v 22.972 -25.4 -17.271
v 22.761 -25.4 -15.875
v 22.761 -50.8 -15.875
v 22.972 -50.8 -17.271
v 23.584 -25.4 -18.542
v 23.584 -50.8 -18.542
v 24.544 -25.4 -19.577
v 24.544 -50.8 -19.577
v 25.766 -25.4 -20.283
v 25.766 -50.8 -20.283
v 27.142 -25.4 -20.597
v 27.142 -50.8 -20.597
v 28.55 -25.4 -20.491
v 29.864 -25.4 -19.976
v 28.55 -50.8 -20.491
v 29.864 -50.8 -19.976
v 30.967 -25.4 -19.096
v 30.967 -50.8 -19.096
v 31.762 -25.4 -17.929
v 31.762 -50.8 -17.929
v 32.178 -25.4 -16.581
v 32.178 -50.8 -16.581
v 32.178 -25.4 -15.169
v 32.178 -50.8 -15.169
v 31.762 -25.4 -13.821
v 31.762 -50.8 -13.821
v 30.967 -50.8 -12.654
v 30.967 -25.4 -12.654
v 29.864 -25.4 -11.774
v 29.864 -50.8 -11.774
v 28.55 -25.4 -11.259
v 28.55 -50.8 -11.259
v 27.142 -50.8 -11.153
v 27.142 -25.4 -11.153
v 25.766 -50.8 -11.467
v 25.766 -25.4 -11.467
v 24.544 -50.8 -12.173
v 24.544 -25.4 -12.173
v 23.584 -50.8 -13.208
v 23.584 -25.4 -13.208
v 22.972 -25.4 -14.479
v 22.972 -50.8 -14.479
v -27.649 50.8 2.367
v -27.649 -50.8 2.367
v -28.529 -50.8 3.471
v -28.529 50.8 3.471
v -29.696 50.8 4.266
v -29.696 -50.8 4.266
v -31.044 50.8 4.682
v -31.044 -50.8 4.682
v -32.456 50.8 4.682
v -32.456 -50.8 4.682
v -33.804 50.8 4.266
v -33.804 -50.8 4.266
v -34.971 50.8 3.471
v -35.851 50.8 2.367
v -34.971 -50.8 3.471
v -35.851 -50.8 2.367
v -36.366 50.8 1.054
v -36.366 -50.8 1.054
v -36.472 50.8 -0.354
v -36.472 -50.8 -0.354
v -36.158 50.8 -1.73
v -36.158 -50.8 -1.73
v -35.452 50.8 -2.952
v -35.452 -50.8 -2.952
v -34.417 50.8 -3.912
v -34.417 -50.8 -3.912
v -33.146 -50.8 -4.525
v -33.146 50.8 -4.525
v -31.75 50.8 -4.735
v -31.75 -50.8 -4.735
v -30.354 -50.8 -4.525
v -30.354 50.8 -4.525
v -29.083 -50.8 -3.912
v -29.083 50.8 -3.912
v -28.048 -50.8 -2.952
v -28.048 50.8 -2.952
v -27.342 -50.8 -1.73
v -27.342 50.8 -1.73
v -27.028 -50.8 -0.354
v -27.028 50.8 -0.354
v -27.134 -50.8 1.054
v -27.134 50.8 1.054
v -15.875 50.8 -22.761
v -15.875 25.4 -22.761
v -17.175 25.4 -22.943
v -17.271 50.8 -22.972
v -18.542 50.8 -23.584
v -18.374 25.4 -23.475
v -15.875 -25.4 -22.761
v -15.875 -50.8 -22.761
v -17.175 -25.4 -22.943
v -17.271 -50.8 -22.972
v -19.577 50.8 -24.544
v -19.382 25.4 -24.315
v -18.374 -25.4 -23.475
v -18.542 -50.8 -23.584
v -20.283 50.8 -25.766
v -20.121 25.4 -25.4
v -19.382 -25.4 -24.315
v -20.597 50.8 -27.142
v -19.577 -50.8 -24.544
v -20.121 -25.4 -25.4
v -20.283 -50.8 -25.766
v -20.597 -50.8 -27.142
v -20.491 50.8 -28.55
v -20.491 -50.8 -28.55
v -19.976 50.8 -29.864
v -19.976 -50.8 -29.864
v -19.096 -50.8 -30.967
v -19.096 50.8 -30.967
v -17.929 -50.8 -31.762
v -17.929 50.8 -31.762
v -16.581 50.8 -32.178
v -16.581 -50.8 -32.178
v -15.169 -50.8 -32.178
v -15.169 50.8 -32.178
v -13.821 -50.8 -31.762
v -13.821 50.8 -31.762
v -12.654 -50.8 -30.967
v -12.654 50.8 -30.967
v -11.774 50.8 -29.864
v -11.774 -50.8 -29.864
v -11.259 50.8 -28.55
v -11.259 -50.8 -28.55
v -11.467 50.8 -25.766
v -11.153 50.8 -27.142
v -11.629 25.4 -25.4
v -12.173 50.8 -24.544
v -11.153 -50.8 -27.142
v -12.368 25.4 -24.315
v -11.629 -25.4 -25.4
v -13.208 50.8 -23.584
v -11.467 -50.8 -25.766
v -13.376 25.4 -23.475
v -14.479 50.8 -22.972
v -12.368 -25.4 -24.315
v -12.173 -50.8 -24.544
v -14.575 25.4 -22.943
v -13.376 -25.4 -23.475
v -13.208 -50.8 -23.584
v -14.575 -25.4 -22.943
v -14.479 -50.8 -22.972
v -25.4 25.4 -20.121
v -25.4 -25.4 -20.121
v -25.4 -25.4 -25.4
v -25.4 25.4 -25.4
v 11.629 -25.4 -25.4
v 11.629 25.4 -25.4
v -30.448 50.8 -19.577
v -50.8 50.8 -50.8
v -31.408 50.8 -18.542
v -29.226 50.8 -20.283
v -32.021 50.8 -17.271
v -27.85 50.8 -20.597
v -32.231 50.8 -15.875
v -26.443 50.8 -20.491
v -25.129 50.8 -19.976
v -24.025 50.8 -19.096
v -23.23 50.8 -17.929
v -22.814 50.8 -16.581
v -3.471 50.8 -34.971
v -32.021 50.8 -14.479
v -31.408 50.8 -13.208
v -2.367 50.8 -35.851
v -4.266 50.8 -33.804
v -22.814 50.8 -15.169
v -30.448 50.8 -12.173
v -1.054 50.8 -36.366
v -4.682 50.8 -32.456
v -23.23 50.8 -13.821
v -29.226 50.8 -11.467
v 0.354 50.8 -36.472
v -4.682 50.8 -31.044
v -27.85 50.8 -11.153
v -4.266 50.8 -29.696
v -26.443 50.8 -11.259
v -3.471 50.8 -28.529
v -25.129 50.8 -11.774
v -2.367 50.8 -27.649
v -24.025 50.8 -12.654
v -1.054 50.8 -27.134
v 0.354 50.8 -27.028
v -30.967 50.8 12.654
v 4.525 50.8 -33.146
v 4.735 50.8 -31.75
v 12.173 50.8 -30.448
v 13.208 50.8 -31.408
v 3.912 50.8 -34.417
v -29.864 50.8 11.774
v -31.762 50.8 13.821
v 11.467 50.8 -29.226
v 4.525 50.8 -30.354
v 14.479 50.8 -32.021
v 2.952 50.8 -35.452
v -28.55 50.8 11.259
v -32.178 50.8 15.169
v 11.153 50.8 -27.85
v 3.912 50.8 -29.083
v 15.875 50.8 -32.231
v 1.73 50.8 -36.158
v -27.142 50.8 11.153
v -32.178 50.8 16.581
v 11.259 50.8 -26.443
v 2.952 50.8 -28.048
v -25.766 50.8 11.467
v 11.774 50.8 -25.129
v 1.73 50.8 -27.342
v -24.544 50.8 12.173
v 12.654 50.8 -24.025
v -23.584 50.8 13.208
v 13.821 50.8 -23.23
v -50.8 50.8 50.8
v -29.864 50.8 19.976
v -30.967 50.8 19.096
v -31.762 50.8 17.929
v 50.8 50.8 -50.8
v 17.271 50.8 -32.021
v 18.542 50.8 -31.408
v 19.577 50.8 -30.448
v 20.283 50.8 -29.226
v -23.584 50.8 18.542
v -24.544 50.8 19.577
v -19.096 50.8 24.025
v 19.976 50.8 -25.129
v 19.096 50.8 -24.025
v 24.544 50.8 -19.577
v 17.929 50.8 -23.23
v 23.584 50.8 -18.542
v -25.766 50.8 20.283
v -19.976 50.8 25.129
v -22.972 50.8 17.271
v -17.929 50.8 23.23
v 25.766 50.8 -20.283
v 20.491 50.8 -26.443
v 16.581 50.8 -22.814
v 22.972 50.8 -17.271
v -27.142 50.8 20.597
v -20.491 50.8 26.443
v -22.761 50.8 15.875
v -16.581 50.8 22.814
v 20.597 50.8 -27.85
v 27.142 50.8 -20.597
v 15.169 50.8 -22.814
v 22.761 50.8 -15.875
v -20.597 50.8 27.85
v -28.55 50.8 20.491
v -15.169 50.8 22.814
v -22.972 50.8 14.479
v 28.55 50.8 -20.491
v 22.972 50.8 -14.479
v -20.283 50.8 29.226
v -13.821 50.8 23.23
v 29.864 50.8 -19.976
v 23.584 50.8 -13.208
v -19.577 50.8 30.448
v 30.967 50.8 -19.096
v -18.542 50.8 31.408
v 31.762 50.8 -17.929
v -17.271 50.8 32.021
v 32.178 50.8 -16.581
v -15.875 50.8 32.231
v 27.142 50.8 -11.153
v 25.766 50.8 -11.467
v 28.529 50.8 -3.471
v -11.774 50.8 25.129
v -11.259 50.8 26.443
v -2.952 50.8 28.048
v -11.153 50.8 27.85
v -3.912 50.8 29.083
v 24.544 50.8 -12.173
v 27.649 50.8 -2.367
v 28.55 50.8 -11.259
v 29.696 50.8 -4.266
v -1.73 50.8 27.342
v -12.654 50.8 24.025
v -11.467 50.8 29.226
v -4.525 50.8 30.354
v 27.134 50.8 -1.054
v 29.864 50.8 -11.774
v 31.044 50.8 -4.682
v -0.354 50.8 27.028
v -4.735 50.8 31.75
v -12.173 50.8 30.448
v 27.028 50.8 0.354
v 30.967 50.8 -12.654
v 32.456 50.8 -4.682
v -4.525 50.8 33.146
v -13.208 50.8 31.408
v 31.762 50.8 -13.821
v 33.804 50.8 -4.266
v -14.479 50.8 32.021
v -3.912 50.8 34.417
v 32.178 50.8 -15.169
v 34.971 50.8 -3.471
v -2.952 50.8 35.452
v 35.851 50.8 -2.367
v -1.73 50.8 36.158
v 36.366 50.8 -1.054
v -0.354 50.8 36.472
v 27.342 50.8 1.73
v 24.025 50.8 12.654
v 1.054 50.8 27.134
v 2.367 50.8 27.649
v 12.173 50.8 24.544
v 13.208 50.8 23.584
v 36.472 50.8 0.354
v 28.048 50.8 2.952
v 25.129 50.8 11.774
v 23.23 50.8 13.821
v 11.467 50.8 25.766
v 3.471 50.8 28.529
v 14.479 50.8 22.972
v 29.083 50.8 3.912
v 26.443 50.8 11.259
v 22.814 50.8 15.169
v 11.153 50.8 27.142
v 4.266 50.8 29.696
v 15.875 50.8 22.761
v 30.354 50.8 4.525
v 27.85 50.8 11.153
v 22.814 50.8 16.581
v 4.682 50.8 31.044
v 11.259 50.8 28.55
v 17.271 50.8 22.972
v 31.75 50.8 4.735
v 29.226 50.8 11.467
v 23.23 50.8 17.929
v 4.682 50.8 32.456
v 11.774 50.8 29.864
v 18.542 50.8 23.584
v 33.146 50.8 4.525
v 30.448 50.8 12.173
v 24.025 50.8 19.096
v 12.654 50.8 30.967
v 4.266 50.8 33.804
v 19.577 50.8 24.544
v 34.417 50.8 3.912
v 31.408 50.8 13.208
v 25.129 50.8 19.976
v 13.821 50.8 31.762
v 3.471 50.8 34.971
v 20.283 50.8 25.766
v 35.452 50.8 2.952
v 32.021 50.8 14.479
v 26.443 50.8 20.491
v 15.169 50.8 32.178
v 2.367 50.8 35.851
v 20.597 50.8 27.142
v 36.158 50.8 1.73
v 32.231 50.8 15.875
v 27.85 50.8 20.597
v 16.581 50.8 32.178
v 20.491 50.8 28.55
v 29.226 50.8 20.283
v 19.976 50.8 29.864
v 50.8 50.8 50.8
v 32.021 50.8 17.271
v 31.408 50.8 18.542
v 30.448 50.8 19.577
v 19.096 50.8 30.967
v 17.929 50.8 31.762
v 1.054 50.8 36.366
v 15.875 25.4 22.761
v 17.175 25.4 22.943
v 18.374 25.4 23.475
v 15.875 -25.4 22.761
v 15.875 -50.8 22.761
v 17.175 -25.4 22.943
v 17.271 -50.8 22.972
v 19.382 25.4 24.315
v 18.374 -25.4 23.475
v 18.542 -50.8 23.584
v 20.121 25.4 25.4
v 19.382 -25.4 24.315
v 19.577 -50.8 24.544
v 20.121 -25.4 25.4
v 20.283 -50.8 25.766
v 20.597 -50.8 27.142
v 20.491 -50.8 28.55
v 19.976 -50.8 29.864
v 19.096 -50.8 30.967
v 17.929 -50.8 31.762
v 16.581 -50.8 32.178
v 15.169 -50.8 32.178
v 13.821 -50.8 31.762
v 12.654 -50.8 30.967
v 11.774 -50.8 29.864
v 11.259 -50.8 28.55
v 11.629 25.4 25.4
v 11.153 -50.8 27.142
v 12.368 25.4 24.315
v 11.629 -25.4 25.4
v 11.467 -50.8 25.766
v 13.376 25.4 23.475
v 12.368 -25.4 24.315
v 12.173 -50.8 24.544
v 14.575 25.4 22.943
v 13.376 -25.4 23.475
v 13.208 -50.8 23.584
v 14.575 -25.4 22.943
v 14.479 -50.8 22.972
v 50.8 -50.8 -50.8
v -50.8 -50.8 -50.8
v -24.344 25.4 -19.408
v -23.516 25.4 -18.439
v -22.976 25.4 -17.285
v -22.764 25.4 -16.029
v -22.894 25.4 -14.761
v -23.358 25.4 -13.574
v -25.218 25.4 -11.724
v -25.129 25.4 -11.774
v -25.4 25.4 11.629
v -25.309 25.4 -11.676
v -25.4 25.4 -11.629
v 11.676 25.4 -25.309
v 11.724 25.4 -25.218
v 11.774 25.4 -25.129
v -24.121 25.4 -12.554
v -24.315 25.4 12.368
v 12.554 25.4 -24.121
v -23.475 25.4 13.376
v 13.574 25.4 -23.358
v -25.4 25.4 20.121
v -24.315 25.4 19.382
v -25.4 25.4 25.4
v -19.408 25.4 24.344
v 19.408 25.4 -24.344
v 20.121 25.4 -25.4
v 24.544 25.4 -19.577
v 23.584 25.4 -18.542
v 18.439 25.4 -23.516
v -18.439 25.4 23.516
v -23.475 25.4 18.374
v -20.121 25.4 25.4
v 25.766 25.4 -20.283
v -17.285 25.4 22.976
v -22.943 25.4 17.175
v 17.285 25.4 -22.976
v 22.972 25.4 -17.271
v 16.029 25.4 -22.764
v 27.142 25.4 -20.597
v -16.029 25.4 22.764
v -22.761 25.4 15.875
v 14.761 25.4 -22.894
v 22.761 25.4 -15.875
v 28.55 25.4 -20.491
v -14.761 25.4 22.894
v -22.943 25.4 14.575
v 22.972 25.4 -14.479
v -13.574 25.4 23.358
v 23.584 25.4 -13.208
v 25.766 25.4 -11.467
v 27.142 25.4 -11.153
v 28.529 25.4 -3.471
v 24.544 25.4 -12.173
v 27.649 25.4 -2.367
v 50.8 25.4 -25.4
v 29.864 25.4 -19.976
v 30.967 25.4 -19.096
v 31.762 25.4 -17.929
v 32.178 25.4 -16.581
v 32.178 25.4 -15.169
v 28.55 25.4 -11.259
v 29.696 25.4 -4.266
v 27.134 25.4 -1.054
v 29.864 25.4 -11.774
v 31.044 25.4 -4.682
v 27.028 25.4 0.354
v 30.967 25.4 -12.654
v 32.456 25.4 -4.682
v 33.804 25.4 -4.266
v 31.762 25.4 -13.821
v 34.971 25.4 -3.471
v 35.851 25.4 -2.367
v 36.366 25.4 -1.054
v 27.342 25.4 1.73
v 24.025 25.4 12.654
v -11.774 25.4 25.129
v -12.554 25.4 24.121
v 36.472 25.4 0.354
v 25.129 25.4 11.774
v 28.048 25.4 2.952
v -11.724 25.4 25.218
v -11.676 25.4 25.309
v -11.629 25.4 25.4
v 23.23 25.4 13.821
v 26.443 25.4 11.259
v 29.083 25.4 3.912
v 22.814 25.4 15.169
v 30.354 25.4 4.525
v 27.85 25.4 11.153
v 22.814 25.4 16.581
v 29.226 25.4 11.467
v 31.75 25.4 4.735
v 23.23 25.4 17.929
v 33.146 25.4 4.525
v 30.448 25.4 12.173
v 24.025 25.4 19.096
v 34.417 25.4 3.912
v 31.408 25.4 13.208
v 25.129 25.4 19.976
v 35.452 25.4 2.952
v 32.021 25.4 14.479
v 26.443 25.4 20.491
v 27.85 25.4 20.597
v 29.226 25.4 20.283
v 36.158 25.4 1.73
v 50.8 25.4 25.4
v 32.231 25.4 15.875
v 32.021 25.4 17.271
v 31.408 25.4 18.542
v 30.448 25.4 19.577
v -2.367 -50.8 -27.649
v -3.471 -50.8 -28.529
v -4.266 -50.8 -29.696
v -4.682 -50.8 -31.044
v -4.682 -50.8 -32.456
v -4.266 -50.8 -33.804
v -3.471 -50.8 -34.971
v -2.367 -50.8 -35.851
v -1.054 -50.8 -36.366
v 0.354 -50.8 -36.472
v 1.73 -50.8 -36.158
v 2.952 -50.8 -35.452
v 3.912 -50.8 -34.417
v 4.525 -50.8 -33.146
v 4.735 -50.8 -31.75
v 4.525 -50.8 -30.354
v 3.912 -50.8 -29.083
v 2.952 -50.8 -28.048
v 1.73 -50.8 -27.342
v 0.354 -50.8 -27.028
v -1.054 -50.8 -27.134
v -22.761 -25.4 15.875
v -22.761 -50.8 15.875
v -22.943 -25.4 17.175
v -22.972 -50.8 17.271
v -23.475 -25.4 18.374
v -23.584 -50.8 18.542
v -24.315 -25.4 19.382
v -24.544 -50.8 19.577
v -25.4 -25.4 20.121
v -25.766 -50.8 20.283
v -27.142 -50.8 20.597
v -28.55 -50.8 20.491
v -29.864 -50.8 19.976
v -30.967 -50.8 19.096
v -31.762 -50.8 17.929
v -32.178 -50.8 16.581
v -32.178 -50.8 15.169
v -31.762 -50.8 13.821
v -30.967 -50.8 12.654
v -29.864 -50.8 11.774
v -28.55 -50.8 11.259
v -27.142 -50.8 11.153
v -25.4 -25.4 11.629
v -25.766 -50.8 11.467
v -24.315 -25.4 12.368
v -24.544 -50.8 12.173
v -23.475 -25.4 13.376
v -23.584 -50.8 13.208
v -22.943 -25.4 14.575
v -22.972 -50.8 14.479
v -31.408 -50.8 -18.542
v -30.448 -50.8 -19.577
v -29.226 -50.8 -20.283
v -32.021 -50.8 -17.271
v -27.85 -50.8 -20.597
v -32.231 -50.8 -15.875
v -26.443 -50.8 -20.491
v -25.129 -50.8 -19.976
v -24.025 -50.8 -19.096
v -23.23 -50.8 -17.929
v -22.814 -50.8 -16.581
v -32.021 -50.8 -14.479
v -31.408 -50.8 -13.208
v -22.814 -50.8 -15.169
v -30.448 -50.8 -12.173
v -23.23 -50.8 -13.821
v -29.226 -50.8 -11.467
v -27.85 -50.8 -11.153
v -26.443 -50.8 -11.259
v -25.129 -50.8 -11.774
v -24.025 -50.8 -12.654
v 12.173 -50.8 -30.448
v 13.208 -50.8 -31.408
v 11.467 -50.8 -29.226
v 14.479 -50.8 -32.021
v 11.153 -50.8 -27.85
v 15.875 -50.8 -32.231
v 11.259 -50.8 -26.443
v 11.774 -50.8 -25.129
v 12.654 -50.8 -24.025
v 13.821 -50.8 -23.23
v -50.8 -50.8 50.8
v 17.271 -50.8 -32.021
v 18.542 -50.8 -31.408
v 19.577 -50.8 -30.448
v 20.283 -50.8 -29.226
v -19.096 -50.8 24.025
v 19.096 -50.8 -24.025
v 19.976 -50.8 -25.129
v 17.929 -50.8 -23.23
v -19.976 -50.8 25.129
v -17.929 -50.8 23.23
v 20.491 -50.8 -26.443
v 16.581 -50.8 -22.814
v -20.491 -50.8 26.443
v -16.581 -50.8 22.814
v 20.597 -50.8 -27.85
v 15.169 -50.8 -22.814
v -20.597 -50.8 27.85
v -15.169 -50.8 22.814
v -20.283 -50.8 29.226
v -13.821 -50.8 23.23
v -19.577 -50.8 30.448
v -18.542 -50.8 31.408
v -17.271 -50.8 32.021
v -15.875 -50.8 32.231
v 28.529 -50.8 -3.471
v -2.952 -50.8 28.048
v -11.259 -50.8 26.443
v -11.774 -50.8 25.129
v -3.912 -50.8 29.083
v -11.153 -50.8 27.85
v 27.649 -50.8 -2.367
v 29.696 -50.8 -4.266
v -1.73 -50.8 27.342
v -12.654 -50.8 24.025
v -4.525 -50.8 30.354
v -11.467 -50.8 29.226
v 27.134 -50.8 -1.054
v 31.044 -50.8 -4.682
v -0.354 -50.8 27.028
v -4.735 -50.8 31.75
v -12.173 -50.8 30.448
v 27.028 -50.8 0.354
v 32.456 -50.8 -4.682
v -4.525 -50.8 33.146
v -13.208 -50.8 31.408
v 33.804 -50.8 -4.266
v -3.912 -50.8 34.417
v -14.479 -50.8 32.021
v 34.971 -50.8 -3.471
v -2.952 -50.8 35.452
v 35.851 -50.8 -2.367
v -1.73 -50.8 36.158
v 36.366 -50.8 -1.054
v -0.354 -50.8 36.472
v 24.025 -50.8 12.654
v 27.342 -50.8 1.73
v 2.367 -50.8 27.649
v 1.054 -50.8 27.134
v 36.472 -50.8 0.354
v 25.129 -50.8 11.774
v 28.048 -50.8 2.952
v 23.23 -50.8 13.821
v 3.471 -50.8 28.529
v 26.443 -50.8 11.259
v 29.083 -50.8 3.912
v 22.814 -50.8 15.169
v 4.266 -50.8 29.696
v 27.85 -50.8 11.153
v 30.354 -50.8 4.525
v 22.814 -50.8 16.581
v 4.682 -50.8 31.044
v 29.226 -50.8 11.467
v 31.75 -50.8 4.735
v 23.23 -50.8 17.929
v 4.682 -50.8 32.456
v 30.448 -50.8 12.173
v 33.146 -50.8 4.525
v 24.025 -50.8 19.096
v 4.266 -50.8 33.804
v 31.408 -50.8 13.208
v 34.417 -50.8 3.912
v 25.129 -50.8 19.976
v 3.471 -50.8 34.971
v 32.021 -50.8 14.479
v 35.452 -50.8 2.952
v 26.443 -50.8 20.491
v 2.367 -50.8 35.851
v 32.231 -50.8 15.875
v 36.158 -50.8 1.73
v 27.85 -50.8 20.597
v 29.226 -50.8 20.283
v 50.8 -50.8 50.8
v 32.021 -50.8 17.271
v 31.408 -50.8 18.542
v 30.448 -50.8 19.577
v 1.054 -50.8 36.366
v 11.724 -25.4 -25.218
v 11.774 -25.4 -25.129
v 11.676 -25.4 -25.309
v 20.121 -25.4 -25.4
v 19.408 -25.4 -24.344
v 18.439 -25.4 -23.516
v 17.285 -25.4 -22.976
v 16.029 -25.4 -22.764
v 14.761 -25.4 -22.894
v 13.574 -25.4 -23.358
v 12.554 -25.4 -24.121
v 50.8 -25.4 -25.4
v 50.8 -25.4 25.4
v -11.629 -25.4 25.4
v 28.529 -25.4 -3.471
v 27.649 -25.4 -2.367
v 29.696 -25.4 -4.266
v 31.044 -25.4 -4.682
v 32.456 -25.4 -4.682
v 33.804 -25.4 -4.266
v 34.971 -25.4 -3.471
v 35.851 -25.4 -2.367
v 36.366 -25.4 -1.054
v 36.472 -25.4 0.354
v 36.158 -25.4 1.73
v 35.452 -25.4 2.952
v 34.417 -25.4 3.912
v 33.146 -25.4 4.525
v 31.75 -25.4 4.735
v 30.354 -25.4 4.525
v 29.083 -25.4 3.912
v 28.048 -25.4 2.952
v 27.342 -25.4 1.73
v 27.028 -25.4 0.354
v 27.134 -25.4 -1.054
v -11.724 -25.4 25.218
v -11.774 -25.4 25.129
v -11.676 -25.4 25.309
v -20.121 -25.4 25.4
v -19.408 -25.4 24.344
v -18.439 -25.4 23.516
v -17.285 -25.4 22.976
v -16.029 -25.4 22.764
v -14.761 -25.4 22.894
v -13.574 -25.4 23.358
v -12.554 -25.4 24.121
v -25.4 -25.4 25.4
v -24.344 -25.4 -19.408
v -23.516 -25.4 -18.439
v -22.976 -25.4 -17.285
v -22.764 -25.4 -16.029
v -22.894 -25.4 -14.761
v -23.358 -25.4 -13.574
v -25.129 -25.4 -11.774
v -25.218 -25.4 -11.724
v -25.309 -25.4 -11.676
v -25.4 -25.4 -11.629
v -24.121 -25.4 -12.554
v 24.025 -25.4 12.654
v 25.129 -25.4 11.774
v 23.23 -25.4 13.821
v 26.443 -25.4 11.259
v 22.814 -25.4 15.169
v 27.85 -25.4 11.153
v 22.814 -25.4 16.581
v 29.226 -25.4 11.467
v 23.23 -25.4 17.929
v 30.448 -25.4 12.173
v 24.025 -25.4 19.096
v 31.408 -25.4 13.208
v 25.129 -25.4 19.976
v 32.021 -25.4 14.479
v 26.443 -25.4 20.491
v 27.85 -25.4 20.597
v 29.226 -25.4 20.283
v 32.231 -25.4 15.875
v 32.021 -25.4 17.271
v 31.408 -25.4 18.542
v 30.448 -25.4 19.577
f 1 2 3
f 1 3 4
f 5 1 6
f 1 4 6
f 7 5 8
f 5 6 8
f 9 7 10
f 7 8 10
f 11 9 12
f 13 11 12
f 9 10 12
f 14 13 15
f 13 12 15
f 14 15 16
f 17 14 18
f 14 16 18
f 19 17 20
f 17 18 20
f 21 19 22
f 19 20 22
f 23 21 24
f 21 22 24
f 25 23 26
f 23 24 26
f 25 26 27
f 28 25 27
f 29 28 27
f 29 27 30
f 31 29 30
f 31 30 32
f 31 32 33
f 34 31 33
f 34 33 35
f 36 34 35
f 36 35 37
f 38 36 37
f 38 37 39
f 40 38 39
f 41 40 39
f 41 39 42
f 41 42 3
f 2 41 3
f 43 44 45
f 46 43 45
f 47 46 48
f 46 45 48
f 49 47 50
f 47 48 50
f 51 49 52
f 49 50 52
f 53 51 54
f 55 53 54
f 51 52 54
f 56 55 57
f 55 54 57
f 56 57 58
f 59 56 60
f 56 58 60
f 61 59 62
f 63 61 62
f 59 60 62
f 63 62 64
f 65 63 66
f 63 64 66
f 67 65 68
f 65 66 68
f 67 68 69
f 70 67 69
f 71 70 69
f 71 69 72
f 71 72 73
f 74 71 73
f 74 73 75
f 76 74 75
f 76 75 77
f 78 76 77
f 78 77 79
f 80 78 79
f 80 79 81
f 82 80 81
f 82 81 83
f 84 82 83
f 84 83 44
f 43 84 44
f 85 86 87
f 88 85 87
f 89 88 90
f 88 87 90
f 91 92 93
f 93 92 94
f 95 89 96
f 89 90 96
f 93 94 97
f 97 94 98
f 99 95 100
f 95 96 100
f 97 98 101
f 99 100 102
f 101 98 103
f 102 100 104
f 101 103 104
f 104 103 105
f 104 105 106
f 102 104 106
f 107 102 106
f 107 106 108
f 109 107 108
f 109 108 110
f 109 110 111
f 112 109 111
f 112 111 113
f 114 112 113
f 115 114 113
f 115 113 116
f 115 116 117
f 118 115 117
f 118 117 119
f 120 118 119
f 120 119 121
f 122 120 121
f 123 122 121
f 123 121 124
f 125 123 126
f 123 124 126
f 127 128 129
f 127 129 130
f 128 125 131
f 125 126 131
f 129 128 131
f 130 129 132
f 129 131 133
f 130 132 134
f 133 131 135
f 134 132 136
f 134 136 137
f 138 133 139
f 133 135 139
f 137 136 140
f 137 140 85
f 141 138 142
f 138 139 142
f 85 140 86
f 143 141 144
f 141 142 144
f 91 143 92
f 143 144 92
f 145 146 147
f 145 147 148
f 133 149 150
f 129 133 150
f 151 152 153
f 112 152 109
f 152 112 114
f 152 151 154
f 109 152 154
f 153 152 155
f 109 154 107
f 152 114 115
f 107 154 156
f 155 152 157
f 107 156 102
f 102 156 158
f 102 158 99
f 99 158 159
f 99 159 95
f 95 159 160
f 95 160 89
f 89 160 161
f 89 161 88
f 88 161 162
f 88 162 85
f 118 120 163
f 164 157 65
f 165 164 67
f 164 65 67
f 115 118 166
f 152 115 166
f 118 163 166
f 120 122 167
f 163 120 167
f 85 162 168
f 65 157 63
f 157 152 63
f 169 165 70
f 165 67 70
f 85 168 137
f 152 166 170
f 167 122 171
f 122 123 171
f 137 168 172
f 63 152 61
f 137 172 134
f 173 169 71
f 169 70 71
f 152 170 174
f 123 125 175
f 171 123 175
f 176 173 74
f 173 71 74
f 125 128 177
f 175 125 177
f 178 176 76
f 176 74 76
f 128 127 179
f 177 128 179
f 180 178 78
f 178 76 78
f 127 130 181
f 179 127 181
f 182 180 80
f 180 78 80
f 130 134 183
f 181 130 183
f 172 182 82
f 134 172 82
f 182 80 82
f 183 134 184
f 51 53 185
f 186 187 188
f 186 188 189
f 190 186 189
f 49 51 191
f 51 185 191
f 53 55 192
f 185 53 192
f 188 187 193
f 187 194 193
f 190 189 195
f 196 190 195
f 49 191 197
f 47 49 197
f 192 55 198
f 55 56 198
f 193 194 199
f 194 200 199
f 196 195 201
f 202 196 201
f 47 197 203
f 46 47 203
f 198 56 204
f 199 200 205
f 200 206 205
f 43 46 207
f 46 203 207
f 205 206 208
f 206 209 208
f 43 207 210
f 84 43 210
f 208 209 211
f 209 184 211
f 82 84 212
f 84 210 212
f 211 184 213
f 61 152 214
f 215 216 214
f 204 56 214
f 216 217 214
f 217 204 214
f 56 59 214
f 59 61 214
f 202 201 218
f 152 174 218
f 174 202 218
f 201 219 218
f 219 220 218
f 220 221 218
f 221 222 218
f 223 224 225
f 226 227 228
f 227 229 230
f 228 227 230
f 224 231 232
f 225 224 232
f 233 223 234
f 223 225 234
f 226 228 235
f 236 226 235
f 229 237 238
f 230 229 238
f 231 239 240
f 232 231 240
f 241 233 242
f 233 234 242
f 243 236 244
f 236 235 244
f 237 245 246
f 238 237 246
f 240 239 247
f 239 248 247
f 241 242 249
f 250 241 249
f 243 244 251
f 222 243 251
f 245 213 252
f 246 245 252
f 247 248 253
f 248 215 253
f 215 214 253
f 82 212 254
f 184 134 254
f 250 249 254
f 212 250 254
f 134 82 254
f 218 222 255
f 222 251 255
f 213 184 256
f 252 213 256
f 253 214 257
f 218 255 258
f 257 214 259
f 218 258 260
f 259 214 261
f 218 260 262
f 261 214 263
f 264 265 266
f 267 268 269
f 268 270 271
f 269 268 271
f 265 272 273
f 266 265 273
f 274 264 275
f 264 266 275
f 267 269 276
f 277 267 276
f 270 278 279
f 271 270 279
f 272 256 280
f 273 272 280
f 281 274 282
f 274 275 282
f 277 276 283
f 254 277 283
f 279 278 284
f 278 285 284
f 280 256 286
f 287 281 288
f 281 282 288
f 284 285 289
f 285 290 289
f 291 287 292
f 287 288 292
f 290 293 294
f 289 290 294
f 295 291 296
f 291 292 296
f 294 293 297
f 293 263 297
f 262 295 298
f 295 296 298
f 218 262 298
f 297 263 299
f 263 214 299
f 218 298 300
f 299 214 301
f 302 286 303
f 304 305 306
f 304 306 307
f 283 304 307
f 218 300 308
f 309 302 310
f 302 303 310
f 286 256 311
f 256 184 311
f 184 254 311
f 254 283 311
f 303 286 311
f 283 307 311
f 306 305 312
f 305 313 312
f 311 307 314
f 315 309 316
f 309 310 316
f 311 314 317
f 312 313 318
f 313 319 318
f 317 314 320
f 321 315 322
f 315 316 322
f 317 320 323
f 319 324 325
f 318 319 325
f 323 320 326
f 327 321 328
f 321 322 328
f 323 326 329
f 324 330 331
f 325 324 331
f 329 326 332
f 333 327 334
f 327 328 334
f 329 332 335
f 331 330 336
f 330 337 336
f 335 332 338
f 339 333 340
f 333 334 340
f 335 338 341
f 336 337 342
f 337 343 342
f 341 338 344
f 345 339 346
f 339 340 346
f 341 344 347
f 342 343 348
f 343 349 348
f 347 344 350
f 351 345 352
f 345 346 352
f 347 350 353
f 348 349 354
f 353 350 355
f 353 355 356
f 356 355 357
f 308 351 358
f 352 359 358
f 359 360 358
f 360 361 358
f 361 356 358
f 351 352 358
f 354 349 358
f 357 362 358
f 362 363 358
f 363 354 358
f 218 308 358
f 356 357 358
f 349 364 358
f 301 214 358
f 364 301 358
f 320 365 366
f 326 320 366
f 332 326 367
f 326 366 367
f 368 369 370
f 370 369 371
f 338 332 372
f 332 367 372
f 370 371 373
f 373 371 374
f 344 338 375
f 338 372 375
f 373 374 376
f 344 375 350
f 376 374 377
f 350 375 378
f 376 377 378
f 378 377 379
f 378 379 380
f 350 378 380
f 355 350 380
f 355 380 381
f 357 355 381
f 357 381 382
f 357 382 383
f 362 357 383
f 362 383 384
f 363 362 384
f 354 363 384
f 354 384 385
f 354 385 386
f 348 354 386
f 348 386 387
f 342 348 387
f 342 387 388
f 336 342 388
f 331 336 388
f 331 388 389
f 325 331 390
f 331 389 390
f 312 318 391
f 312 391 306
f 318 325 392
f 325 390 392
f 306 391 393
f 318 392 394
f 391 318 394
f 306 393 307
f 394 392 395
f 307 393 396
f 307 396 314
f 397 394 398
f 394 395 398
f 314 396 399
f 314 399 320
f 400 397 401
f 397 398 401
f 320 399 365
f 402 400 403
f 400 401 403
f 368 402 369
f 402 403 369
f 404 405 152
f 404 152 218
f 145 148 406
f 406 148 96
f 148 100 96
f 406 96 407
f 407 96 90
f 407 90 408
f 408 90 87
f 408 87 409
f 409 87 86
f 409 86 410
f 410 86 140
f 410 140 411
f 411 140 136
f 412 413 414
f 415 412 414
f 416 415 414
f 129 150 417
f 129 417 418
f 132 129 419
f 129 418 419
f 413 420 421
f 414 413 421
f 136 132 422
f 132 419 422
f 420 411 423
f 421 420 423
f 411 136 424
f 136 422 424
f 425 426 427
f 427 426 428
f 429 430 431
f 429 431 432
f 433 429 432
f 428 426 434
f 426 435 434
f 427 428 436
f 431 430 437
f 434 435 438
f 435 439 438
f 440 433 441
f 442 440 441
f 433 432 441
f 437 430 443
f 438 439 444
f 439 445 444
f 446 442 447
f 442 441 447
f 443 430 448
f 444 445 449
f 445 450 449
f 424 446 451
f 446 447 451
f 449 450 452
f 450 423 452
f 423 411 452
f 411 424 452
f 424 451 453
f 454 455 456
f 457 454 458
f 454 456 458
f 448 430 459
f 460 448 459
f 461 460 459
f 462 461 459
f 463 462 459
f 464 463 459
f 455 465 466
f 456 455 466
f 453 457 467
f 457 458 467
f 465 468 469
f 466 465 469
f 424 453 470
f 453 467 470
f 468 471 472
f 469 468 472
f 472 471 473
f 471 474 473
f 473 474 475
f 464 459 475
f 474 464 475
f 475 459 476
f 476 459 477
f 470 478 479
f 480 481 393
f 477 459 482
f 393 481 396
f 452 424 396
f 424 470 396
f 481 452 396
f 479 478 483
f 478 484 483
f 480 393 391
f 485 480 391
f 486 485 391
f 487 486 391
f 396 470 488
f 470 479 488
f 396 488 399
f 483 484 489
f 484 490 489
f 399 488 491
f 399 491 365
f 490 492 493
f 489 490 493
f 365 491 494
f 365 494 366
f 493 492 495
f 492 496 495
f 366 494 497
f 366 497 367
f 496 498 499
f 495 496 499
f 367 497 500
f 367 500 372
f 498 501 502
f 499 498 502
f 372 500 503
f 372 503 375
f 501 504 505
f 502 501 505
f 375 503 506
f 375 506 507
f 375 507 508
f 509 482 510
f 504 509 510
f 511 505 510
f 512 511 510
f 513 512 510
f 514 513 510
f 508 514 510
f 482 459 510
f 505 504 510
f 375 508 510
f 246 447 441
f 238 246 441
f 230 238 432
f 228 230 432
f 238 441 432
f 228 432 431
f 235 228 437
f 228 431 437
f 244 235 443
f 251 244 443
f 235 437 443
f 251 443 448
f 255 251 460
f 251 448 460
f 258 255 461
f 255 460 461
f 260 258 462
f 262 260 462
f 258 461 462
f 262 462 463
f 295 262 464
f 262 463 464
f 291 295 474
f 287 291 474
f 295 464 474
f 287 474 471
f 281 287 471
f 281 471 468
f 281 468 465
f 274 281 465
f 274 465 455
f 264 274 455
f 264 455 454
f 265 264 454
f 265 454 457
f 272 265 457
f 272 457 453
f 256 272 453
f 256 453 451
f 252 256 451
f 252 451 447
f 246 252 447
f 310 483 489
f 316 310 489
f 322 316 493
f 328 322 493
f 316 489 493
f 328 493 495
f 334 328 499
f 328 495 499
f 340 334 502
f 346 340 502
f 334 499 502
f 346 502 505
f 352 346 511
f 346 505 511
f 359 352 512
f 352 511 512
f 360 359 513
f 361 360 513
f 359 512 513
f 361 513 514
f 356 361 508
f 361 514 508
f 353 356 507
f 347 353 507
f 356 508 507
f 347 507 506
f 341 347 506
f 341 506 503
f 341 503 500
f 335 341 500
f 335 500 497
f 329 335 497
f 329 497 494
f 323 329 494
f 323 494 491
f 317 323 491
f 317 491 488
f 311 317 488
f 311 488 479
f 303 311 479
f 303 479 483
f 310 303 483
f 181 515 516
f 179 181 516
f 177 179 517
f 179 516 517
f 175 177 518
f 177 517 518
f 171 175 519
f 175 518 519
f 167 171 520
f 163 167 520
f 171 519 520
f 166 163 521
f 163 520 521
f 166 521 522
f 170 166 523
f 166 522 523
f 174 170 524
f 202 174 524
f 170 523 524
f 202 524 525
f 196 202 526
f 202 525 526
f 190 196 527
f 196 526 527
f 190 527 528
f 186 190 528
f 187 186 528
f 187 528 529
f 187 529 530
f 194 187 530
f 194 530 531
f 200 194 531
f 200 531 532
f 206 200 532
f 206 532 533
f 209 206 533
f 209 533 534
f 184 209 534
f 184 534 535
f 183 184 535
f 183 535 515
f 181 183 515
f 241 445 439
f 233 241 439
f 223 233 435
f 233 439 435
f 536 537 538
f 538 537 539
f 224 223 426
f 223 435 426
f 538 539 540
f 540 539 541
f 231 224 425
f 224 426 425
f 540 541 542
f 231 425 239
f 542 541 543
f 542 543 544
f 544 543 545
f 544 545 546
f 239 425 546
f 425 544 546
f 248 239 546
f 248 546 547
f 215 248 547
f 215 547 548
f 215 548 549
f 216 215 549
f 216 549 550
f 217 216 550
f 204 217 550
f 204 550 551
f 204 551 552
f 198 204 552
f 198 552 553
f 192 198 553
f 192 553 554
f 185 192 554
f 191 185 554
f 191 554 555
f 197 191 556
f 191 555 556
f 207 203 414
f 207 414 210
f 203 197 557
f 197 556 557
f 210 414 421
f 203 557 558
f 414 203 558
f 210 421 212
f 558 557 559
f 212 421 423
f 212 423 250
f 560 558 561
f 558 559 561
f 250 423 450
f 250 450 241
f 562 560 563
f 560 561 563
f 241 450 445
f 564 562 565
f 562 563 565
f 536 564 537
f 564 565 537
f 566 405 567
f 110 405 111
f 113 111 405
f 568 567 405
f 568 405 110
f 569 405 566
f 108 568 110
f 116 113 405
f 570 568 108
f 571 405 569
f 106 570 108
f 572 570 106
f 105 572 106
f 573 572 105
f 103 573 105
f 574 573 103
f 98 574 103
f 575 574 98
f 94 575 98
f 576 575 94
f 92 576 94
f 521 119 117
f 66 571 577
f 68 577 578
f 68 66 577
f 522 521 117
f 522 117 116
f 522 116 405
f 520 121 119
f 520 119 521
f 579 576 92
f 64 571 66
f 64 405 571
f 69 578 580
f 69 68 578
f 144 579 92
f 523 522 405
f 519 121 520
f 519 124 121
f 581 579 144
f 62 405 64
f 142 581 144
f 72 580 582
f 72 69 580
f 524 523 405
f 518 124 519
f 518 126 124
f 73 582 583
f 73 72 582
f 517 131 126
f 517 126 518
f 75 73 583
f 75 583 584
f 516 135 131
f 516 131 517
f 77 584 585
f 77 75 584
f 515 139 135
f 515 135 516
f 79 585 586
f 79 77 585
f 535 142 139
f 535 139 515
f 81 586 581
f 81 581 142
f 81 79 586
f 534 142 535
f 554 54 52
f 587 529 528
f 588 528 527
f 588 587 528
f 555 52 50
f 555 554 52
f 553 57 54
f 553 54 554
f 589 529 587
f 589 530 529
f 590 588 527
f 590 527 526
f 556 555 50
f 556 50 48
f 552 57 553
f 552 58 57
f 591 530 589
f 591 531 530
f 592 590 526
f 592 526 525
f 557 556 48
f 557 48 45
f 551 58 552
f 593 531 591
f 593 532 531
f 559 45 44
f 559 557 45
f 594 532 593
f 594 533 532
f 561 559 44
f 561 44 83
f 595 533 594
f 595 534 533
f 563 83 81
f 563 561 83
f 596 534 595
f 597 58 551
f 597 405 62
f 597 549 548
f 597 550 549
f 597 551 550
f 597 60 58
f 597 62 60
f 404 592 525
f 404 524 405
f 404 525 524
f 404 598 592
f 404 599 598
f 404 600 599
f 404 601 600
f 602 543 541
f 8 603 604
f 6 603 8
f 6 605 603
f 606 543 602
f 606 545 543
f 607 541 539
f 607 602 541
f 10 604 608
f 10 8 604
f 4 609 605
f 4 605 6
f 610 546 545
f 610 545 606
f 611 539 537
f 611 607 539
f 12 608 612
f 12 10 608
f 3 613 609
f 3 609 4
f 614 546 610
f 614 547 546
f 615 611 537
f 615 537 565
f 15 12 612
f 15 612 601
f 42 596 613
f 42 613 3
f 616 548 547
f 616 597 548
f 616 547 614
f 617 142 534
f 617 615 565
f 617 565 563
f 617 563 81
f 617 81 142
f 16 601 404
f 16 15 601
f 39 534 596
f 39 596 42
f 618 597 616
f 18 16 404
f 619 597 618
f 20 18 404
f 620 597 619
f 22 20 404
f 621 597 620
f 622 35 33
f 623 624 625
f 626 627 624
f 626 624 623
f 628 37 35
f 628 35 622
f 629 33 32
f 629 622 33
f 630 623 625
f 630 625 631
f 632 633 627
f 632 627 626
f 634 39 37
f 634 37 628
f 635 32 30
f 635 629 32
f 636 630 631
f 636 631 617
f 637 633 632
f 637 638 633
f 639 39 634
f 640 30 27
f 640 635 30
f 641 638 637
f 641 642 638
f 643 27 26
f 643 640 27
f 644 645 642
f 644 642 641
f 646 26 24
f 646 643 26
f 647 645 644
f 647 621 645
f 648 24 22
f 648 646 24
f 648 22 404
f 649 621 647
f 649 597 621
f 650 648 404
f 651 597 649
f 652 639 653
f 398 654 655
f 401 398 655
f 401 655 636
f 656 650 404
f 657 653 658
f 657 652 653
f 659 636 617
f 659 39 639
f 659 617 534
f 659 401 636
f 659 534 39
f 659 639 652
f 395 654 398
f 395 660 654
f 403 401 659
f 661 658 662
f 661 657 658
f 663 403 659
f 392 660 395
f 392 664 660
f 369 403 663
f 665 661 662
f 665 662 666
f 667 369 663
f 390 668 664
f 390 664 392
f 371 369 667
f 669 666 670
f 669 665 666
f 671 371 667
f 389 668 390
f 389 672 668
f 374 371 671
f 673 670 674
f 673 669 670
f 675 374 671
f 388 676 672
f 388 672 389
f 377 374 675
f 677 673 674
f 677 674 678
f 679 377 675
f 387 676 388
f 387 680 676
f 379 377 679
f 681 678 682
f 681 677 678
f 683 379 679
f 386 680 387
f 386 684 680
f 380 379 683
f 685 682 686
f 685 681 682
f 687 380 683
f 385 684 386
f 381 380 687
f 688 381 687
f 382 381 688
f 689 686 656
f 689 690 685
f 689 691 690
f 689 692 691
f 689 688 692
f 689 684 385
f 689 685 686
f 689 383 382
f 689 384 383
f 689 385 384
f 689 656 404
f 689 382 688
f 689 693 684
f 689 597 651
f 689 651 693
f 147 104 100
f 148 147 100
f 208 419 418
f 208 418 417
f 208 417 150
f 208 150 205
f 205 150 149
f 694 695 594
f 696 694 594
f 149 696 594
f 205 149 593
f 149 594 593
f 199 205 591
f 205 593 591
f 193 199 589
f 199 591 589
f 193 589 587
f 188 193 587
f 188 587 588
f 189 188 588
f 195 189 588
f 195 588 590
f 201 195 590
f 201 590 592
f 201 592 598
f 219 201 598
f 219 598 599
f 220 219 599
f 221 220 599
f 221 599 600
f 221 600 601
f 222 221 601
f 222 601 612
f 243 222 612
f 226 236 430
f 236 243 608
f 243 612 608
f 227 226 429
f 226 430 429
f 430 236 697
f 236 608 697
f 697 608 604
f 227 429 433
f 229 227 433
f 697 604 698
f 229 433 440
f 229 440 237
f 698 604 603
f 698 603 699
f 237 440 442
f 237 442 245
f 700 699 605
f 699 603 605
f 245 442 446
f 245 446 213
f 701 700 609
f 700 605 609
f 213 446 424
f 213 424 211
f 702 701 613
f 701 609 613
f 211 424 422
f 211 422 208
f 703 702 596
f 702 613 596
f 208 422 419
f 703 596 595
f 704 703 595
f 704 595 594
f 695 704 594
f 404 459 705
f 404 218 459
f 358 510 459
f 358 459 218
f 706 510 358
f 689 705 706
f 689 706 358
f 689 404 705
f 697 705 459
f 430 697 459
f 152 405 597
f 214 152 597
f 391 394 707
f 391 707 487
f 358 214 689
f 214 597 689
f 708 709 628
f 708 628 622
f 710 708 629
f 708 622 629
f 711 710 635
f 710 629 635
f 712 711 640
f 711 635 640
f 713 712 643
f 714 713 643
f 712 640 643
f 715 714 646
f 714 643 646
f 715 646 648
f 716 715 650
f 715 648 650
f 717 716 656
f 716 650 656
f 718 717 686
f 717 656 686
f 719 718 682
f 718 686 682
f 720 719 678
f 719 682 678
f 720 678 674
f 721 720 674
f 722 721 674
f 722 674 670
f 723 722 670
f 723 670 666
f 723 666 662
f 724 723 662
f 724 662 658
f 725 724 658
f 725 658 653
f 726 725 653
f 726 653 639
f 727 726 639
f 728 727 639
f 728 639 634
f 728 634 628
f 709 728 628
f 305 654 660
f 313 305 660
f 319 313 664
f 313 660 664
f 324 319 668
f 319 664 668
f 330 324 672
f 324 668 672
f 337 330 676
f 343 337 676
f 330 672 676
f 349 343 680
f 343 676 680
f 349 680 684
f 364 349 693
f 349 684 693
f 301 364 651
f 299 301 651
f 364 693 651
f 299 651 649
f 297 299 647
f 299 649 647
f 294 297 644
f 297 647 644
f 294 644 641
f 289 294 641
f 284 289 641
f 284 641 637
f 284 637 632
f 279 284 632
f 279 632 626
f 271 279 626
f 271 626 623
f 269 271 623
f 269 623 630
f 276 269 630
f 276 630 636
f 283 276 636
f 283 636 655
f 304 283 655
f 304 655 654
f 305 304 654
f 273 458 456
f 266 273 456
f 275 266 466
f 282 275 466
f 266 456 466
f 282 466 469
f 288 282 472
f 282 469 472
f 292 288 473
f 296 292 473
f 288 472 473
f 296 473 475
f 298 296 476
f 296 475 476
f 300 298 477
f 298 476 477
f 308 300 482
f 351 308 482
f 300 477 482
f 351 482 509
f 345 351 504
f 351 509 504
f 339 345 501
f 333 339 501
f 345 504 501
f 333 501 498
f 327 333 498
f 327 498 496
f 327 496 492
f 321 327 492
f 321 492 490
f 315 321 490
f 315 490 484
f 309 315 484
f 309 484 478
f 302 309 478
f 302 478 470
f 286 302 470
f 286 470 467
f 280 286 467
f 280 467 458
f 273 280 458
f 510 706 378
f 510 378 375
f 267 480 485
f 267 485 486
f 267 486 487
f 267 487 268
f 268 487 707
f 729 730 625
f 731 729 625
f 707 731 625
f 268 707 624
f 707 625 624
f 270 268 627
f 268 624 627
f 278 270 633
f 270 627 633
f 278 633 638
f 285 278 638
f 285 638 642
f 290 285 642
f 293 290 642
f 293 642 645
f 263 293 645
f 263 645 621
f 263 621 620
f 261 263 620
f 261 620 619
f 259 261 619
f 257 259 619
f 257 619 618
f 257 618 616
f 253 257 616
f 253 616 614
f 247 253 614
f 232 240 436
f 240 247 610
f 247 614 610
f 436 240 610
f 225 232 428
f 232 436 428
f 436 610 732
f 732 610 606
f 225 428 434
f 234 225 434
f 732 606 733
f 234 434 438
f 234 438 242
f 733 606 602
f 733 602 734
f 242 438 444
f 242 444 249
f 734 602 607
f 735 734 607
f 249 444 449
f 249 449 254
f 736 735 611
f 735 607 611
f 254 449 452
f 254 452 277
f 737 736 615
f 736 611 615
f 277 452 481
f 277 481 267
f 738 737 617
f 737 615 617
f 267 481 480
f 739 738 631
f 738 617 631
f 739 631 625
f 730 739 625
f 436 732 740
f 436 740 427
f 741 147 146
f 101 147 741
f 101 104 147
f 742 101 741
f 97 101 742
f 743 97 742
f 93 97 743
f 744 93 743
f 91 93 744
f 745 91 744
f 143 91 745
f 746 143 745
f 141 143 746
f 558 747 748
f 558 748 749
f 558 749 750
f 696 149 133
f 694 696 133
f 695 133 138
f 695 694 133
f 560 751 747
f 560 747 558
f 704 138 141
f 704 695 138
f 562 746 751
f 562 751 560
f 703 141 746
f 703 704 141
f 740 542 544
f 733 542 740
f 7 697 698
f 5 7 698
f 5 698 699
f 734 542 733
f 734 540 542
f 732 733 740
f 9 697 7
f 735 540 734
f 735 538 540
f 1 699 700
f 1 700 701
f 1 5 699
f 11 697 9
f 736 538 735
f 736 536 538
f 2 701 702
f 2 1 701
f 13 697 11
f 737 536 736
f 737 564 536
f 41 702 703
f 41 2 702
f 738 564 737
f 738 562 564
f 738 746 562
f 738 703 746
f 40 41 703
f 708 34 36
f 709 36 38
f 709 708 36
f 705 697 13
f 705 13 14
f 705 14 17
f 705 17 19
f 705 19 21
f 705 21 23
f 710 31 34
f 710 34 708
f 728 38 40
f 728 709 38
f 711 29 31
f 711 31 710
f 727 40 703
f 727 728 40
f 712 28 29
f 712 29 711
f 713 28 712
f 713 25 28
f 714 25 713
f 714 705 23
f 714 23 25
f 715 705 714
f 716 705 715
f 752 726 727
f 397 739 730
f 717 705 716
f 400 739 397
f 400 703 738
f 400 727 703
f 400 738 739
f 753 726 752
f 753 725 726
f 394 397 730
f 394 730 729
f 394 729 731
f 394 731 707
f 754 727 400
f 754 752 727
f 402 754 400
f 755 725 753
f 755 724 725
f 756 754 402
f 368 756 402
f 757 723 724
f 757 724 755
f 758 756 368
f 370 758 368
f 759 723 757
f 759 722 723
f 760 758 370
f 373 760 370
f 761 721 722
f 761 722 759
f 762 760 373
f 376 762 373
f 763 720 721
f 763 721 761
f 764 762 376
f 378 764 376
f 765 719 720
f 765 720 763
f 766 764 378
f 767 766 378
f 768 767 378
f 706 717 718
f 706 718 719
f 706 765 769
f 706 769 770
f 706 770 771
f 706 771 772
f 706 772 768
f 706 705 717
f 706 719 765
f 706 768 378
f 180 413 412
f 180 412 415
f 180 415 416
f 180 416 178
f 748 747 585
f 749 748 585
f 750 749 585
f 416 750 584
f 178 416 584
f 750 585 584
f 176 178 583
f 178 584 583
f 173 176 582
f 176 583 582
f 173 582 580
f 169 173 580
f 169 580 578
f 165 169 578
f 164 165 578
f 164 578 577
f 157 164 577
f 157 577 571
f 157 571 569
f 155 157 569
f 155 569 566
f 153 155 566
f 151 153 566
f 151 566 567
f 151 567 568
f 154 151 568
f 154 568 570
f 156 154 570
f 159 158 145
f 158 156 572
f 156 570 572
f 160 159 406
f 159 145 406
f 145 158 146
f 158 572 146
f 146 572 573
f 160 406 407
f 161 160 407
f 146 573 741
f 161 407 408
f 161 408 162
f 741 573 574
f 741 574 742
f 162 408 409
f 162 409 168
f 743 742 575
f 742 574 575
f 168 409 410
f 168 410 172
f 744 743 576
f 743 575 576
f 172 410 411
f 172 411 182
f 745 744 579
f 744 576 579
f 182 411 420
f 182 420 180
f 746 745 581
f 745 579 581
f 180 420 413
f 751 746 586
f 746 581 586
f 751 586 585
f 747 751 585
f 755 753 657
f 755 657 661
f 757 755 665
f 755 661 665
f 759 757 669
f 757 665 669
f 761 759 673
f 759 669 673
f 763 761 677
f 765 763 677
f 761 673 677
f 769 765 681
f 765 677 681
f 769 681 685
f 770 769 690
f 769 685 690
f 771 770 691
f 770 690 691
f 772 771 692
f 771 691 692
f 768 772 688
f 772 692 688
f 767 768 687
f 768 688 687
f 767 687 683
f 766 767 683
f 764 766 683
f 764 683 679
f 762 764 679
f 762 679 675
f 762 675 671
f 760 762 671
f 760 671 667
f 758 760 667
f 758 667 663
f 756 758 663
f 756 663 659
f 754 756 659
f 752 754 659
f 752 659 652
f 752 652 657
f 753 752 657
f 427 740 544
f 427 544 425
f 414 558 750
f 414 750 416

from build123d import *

# Parameters (mm, degrees)
F0_W     = 101.6
F0_H     = 101.6
F1_DEPTH = 50.8
F2_R     = 4.7348864271
F3_DEPTH = 101.601
F5_COUNT = 12
F5_ANGLE = 330
F6_W     = 50.8
F6_H     = 50.8
F7_DEPTH = 76.2


with BuildPart() as f1:
    # F0 (on Front) → F1 (new body, symmetric)
    with BuildSketch(Plane.XZ):
        Rectangle(F0_W, F0_H)
    extrude(amount=F1_DEPTH, both=True)

    # F2 (on face) → F3 (cut, through all)
    with BuildSketch(Plane.XZ.offset(50.8)):
        with Locations((-27.4963065702, 15.875)):
            Circle(F2_R)
    f3 = extrude(amount=-F3_DEPTH, mode=Mode.SUBTRACT)

    # F5: F3 ×12 about axis
    f5_axis = Axis((0, 0, 0), (0, -1, 0))
    for i in range(1, F5_COUNT):
        add(f3.rotate(f5_axis, i * F5_ANGLE / (F5_COUNT - 1)), mode=Mode.SUBTRACT)

    # F6 (on face) → F7 (cut)
    with BuildSketch(Plane.YZ.offset(50.8)):
        Rectangle(F6_W, F6_H)
    extrude(amount=-F7_DEPTH, mode=Mode.SUBTRACT)


solid = f1.part
